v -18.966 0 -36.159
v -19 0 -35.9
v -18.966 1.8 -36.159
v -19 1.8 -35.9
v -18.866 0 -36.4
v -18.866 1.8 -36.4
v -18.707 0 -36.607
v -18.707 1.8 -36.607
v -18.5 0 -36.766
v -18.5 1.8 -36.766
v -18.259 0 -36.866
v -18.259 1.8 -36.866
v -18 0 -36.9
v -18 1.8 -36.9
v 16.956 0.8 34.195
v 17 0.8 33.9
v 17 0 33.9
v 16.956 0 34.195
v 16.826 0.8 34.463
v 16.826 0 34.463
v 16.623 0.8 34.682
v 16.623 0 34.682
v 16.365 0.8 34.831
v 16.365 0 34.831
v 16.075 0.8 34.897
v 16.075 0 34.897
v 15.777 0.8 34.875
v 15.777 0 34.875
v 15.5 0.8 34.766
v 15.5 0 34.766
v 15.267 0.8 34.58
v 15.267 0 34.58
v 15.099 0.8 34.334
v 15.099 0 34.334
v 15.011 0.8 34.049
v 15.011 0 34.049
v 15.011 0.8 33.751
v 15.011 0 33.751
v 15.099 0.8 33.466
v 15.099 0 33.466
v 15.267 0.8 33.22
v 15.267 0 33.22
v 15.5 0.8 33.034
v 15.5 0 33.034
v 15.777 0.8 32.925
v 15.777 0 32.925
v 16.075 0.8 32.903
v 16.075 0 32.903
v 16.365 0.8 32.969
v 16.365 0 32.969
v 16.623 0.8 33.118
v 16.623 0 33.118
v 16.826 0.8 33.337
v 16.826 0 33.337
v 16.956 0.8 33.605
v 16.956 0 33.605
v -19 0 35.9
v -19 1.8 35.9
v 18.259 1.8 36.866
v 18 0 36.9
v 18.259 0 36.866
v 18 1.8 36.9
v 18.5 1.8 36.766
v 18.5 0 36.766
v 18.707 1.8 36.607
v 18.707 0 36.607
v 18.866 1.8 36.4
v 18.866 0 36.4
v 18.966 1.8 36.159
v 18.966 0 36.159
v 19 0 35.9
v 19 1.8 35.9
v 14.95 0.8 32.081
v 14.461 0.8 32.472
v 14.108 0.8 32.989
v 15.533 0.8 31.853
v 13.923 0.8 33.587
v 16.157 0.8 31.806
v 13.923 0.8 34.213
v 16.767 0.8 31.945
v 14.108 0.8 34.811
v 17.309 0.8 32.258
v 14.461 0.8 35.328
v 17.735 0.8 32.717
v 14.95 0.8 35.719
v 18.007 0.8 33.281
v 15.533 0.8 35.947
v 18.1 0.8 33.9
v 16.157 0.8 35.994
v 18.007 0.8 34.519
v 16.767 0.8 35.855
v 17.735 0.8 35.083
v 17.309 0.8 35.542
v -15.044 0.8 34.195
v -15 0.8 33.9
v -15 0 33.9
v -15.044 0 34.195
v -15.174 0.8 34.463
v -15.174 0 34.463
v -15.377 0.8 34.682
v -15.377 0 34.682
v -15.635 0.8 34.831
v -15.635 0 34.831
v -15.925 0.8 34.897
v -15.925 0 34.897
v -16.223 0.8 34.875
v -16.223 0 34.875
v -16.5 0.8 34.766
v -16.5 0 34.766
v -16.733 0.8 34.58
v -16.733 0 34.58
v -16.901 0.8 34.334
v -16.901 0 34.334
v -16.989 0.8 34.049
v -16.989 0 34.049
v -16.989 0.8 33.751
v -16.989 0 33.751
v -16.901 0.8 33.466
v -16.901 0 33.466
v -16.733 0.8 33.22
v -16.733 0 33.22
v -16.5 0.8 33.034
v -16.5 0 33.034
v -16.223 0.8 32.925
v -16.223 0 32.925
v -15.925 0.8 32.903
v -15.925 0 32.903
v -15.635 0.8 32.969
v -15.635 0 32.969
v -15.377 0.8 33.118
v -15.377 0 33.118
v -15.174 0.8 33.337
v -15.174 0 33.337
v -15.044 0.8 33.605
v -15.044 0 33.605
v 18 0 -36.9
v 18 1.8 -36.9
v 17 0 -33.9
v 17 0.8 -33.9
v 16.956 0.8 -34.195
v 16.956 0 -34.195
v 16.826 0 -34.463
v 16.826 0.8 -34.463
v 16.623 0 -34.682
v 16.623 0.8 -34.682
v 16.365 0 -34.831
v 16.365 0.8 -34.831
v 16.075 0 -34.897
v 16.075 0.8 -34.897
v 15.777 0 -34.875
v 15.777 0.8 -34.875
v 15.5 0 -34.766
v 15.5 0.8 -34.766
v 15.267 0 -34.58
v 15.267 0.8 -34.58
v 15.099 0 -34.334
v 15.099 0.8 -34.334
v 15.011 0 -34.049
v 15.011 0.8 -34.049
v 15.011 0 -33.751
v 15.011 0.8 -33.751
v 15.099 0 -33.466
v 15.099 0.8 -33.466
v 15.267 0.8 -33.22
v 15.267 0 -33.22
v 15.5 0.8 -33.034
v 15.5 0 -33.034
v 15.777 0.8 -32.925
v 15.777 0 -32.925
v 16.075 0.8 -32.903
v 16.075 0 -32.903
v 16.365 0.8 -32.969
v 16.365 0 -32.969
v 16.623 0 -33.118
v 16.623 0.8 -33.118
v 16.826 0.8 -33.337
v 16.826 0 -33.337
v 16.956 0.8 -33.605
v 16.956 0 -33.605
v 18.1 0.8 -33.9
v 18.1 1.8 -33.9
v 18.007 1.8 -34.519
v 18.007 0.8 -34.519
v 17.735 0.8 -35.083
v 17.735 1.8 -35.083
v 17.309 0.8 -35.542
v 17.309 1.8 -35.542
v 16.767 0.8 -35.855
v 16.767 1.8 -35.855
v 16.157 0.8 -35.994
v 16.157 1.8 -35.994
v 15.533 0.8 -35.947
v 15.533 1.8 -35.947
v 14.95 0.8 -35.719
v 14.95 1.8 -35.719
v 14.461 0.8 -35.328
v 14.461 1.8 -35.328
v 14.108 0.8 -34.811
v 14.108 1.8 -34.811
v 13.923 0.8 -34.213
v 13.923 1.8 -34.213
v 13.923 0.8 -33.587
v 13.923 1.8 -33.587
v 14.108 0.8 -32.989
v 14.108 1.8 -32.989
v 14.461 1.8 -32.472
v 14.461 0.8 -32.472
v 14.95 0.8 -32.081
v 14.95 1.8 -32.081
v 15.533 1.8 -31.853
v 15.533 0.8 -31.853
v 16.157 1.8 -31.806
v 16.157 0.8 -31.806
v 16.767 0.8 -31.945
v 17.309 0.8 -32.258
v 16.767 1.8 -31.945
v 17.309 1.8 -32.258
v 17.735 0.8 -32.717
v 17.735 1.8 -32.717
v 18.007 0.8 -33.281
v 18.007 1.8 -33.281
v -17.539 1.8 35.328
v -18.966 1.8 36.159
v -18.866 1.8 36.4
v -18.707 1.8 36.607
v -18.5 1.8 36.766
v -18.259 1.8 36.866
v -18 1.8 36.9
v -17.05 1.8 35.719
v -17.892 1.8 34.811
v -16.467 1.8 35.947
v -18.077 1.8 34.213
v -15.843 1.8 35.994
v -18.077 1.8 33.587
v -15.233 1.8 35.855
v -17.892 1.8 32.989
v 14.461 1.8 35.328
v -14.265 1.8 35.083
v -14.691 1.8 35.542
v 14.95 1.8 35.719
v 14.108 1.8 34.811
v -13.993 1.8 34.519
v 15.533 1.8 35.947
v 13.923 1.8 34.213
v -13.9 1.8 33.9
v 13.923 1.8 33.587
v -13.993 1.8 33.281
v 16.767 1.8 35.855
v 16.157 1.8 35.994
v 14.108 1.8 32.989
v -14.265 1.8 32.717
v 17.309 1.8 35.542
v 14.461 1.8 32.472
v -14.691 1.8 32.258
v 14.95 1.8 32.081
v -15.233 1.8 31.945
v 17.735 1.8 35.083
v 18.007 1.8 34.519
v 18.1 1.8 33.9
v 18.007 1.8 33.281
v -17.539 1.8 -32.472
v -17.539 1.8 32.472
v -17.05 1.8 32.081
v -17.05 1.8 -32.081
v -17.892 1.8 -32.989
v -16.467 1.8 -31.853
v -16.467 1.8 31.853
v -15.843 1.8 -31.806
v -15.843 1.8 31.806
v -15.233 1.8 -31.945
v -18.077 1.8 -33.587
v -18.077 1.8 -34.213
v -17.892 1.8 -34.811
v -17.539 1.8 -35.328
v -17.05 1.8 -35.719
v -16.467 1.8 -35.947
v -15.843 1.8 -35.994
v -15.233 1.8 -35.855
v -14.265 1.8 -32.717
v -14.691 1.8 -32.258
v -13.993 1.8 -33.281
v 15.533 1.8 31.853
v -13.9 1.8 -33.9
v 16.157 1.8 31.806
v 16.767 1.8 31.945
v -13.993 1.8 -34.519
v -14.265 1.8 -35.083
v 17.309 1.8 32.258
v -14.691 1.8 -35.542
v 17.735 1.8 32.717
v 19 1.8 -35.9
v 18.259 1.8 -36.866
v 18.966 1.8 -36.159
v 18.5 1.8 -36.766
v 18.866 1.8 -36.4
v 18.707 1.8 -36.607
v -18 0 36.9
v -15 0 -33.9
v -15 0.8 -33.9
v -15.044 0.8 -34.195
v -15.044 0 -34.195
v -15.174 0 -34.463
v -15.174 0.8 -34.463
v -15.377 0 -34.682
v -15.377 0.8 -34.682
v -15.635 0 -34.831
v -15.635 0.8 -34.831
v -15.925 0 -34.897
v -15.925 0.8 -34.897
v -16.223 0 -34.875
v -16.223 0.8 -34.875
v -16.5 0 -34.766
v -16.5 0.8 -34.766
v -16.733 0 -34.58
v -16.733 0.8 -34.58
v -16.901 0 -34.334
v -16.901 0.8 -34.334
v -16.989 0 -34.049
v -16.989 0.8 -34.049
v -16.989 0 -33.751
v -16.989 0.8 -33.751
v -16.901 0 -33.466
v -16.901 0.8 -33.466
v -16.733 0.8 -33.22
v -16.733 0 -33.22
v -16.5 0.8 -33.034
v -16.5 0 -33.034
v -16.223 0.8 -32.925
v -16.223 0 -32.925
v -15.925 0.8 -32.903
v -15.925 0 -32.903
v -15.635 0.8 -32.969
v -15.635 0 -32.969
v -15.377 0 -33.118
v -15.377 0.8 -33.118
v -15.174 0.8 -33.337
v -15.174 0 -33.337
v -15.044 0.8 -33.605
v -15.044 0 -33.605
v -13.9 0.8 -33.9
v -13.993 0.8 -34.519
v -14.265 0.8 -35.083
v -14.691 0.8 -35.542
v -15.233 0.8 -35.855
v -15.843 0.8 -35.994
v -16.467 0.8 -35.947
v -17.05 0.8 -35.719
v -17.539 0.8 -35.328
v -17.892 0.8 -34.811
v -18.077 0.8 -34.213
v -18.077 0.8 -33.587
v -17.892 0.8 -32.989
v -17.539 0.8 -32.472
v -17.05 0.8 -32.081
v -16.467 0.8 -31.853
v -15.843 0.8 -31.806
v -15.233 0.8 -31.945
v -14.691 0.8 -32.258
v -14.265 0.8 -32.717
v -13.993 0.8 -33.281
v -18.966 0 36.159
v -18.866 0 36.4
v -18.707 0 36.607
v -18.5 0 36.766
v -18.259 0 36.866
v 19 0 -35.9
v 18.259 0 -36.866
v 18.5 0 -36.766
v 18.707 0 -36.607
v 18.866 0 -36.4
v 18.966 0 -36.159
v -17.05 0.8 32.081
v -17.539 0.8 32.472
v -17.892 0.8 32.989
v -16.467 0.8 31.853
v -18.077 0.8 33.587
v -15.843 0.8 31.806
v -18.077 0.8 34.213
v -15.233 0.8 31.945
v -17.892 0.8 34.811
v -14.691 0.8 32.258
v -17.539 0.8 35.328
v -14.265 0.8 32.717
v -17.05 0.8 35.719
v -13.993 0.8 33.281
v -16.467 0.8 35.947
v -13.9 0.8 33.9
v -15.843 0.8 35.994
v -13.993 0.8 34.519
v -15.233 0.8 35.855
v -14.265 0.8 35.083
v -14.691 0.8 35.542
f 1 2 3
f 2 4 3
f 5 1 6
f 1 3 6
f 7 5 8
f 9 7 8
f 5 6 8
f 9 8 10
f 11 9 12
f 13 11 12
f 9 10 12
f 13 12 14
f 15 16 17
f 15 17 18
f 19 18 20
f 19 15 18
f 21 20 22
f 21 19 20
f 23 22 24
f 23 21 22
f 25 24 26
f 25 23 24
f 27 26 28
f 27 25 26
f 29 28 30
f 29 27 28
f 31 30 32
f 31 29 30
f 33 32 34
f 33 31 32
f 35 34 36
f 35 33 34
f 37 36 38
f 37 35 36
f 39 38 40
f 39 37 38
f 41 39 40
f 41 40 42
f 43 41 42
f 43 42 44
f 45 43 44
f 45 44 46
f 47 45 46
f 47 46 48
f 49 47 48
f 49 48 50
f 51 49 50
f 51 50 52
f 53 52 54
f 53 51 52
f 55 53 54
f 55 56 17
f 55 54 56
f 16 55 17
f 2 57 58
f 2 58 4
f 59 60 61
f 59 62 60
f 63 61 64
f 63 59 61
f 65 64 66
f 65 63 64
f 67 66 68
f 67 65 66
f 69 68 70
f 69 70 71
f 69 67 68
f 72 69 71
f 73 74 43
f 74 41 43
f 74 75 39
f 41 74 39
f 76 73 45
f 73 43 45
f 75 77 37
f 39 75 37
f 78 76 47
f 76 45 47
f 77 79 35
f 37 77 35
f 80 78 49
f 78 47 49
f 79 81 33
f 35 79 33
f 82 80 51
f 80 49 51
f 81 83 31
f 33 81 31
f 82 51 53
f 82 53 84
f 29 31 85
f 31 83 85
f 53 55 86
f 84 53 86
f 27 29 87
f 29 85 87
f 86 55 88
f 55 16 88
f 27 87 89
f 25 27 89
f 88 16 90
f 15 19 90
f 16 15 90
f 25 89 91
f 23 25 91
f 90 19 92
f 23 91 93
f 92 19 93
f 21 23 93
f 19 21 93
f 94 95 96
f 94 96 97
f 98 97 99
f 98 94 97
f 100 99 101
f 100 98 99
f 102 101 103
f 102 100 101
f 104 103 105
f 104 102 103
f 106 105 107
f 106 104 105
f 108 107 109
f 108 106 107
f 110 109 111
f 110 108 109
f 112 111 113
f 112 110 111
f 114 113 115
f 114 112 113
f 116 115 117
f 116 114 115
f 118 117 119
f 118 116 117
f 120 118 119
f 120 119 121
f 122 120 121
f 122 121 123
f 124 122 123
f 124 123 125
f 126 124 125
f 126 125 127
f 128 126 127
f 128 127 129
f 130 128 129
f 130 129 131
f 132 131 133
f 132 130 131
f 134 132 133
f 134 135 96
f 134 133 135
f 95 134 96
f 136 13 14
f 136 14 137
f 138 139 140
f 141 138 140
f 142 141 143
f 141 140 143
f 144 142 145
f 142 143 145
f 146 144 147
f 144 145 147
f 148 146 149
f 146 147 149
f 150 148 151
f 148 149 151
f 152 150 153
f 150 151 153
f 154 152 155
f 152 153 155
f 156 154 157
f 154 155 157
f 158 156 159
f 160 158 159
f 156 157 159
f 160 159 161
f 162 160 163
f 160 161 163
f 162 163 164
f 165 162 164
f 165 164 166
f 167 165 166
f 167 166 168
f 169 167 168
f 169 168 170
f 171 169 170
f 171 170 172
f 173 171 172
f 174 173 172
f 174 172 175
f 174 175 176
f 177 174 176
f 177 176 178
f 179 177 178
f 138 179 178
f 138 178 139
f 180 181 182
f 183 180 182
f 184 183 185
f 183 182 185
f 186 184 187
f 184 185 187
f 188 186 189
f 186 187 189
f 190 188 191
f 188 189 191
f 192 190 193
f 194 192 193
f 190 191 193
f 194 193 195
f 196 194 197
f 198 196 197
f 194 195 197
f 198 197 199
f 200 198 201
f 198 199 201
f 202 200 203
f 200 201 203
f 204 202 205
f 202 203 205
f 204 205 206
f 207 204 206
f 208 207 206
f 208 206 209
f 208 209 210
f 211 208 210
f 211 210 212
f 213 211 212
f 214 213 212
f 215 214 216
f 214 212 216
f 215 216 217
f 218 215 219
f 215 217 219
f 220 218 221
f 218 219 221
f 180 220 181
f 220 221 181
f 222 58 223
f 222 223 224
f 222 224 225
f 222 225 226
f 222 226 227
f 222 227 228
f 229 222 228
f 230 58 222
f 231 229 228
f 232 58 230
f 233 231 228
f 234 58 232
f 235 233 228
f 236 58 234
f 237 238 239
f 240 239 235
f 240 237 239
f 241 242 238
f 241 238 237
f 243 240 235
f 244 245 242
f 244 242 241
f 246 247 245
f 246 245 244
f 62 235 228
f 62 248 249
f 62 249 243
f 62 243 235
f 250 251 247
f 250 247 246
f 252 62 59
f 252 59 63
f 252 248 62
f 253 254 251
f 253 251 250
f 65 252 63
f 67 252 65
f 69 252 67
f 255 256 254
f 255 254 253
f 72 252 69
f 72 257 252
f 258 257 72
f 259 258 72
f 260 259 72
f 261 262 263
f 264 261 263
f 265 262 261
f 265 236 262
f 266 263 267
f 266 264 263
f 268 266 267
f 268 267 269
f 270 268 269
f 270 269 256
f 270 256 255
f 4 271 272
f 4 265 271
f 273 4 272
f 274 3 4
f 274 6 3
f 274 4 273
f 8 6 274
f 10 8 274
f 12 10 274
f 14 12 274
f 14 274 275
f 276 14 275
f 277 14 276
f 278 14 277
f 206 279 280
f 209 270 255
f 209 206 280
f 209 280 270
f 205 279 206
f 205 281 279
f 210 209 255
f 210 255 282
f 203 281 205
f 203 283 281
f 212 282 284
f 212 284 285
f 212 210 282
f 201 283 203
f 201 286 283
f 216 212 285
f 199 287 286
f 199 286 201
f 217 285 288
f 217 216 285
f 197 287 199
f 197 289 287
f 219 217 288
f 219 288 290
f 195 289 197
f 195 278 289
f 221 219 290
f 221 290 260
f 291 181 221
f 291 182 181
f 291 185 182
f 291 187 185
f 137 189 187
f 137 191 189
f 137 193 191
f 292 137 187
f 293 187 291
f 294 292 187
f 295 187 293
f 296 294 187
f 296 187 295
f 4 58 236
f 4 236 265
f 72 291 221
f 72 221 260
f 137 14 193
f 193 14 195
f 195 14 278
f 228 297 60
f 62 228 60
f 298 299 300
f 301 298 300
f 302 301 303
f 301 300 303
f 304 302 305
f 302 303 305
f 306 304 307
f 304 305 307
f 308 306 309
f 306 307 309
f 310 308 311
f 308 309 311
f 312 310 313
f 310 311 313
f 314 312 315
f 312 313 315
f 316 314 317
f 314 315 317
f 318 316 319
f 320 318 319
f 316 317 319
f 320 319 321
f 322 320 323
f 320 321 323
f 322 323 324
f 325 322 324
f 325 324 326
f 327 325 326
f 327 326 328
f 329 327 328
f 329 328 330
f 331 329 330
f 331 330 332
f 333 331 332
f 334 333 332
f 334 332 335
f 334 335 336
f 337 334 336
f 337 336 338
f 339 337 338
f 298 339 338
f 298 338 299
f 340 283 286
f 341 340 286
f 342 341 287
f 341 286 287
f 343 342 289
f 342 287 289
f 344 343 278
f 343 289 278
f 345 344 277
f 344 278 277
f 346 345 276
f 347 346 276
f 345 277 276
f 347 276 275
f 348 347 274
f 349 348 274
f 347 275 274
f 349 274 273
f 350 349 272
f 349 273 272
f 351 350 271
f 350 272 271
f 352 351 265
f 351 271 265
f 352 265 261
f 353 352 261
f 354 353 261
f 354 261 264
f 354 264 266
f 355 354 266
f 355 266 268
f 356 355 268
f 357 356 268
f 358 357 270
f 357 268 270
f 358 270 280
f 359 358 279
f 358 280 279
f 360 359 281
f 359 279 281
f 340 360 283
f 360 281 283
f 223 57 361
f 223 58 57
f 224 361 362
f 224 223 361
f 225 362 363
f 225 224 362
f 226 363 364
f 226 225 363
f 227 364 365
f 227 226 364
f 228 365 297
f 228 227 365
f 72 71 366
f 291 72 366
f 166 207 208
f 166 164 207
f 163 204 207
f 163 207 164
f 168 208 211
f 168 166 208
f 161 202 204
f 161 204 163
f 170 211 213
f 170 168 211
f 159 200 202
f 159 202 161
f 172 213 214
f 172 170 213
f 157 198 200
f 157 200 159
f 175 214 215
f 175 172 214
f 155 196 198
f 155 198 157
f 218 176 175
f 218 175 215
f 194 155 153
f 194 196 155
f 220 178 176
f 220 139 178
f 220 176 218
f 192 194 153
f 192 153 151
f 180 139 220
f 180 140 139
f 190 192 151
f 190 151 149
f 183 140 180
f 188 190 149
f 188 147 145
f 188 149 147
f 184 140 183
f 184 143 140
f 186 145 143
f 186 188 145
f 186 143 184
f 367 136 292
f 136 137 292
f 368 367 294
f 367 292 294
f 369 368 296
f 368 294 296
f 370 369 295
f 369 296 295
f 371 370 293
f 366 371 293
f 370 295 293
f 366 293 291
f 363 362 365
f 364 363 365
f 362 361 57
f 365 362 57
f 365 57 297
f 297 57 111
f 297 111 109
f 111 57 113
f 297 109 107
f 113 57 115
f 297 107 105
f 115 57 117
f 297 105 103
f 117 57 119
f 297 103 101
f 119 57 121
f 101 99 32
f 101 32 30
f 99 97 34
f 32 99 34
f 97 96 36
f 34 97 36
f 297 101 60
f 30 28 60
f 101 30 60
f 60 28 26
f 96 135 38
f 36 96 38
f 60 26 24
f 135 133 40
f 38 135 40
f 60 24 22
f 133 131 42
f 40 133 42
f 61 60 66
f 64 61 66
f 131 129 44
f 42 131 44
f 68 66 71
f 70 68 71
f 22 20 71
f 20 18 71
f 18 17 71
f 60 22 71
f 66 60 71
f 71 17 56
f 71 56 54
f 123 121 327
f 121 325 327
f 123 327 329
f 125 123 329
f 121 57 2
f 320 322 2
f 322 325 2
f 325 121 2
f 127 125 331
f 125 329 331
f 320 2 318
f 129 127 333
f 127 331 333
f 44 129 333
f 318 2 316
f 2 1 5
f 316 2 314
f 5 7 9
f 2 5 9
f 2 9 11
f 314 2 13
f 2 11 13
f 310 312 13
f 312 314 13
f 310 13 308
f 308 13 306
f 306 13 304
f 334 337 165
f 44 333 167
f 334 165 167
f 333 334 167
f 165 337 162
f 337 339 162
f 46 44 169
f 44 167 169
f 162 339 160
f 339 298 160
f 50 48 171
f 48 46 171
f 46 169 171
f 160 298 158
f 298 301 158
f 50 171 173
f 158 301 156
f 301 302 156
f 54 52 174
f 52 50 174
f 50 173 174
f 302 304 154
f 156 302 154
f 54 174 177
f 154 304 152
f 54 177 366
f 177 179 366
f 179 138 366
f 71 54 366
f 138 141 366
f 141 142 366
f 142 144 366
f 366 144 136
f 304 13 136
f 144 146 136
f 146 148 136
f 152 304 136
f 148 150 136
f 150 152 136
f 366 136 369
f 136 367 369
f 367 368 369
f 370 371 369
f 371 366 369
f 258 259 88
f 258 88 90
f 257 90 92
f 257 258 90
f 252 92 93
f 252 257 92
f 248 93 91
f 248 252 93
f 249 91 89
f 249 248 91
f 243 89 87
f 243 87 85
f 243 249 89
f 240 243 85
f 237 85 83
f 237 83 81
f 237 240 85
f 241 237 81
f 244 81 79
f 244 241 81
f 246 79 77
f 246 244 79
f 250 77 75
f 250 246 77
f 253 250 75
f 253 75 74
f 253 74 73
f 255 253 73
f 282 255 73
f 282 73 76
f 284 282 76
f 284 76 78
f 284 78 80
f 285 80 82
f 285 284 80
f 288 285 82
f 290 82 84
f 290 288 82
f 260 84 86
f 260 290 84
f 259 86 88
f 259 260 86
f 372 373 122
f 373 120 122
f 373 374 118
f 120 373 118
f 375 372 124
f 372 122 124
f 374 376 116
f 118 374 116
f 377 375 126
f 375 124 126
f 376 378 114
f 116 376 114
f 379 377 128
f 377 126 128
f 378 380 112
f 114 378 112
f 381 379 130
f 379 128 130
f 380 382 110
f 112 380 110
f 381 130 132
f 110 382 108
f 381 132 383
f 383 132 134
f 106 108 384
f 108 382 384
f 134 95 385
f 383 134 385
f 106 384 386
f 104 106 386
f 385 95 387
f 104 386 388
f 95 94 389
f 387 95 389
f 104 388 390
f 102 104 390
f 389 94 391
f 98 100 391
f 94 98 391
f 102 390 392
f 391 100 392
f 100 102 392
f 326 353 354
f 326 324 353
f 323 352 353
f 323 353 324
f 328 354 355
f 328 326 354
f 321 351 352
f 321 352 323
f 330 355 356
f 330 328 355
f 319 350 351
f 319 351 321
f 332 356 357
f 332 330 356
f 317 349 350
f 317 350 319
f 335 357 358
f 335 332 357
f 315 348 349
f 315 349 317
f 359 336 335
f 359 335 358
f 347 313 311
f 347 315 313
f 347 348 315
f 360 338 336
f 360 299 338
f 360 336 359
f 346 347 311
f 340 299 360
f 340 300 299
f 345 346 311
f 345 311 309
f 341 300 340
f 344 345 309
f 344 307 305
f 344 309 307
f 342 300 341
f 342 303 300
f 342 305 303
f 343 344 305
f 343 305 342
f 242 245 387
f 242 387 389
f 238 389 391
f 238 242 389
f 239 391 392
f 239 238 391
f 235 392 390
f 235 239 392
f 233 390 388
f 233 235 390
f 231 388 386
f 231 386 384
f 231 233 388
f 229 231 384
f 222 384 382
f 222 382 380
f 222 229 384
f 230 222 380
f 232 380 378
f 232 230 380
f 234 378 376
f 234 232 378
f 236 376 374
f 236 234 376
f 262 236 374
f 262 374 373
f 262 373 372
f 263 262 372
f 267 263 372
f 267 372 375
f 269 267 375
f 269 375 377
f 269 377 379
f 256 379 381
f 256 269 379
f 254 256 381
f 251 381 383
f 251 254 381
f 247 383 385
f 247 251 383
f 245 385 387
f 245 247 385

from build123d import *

# Parameters (mm, degrees)
SKETCH1_W           = 38
SKETCH1_H           = 73.8
BOSS_EXTRUDE1_DEPTH = 1.8
SKETCH2_R           = 1
CUT_EXTRUDE1_DEPTH  = 2.8
SKETCH3_R           = 2.1
CUT_EXTRUDE2_DEPTH  = 1
FILLET1_R           = 1


with BuildPart() as part:
    # Sketch1 → Boss-Extrude1 (new body)
    with BuildSketch(Plane(origin=(0, 0, 0), x_dir=(1, 0, 0), z_dir=(0, 1, 0))):
        Rectangle(SKETCH1_W, SKETCH1_H)
    extrude(amount=BOSS_EXTRUDE1_DEPTH)

    # Sketch2 → Cut-Extrude1 (cut, through all)
    with BuildSketch(Plane(origin=(0, 1.8, 0), x_dir=(1, 0, 0), z_dir=(0, 1, 0))):
        with Locations((-16, 33.9)):
            Circle(SKETCH2_R)
        with Locations((16, 33.9)):
            Circle(SKETCH2_R)
    cut_extrude1 = extrude(amount=-CUT_EXTRUDE1_DEPTH, mode=Mode.SUBTRACT)

    # Sketch3 → Cut-Extrude2 (cut)
    with BuildSketch(Plane(origin=(0, 1.8, 0), x_dir=(1, 0, 0), z_dir=(0, 1, 0))):
        with Locations((-16, 33.9)):
            Circle(SKETCH3_R)
        with Locations((16, 33.9)):
            Circle(SKETCH3_R)
    cut_extrude2 = extrude(amount=-CUT_EXTRUDE2_DEPTH, mode=Mode.SUBTRACT)

    # Mirror1: Cut-Extrude1, Cut-Extrude2 across plane
    add(cut_extrude1.mirror(Plane.XY), mode=Mode.SUBTRACT)
    add(cut_extrude2.mirror(Plane.XY), mode=Mode.SUBTRACT)

    # Fillet1
    fillet1_edges = [part.edges().sort_by_distance(p)[0] for p in [
        (19, 0.9, 36.9),
        (-19, 0.9, 36.9),
        (-19, 0.9, -36.9),
        (19, 0.9, -36.9),
    ]]
    fillet(fillet1_edges, radius=FILLET1_R)


solid = part.part
